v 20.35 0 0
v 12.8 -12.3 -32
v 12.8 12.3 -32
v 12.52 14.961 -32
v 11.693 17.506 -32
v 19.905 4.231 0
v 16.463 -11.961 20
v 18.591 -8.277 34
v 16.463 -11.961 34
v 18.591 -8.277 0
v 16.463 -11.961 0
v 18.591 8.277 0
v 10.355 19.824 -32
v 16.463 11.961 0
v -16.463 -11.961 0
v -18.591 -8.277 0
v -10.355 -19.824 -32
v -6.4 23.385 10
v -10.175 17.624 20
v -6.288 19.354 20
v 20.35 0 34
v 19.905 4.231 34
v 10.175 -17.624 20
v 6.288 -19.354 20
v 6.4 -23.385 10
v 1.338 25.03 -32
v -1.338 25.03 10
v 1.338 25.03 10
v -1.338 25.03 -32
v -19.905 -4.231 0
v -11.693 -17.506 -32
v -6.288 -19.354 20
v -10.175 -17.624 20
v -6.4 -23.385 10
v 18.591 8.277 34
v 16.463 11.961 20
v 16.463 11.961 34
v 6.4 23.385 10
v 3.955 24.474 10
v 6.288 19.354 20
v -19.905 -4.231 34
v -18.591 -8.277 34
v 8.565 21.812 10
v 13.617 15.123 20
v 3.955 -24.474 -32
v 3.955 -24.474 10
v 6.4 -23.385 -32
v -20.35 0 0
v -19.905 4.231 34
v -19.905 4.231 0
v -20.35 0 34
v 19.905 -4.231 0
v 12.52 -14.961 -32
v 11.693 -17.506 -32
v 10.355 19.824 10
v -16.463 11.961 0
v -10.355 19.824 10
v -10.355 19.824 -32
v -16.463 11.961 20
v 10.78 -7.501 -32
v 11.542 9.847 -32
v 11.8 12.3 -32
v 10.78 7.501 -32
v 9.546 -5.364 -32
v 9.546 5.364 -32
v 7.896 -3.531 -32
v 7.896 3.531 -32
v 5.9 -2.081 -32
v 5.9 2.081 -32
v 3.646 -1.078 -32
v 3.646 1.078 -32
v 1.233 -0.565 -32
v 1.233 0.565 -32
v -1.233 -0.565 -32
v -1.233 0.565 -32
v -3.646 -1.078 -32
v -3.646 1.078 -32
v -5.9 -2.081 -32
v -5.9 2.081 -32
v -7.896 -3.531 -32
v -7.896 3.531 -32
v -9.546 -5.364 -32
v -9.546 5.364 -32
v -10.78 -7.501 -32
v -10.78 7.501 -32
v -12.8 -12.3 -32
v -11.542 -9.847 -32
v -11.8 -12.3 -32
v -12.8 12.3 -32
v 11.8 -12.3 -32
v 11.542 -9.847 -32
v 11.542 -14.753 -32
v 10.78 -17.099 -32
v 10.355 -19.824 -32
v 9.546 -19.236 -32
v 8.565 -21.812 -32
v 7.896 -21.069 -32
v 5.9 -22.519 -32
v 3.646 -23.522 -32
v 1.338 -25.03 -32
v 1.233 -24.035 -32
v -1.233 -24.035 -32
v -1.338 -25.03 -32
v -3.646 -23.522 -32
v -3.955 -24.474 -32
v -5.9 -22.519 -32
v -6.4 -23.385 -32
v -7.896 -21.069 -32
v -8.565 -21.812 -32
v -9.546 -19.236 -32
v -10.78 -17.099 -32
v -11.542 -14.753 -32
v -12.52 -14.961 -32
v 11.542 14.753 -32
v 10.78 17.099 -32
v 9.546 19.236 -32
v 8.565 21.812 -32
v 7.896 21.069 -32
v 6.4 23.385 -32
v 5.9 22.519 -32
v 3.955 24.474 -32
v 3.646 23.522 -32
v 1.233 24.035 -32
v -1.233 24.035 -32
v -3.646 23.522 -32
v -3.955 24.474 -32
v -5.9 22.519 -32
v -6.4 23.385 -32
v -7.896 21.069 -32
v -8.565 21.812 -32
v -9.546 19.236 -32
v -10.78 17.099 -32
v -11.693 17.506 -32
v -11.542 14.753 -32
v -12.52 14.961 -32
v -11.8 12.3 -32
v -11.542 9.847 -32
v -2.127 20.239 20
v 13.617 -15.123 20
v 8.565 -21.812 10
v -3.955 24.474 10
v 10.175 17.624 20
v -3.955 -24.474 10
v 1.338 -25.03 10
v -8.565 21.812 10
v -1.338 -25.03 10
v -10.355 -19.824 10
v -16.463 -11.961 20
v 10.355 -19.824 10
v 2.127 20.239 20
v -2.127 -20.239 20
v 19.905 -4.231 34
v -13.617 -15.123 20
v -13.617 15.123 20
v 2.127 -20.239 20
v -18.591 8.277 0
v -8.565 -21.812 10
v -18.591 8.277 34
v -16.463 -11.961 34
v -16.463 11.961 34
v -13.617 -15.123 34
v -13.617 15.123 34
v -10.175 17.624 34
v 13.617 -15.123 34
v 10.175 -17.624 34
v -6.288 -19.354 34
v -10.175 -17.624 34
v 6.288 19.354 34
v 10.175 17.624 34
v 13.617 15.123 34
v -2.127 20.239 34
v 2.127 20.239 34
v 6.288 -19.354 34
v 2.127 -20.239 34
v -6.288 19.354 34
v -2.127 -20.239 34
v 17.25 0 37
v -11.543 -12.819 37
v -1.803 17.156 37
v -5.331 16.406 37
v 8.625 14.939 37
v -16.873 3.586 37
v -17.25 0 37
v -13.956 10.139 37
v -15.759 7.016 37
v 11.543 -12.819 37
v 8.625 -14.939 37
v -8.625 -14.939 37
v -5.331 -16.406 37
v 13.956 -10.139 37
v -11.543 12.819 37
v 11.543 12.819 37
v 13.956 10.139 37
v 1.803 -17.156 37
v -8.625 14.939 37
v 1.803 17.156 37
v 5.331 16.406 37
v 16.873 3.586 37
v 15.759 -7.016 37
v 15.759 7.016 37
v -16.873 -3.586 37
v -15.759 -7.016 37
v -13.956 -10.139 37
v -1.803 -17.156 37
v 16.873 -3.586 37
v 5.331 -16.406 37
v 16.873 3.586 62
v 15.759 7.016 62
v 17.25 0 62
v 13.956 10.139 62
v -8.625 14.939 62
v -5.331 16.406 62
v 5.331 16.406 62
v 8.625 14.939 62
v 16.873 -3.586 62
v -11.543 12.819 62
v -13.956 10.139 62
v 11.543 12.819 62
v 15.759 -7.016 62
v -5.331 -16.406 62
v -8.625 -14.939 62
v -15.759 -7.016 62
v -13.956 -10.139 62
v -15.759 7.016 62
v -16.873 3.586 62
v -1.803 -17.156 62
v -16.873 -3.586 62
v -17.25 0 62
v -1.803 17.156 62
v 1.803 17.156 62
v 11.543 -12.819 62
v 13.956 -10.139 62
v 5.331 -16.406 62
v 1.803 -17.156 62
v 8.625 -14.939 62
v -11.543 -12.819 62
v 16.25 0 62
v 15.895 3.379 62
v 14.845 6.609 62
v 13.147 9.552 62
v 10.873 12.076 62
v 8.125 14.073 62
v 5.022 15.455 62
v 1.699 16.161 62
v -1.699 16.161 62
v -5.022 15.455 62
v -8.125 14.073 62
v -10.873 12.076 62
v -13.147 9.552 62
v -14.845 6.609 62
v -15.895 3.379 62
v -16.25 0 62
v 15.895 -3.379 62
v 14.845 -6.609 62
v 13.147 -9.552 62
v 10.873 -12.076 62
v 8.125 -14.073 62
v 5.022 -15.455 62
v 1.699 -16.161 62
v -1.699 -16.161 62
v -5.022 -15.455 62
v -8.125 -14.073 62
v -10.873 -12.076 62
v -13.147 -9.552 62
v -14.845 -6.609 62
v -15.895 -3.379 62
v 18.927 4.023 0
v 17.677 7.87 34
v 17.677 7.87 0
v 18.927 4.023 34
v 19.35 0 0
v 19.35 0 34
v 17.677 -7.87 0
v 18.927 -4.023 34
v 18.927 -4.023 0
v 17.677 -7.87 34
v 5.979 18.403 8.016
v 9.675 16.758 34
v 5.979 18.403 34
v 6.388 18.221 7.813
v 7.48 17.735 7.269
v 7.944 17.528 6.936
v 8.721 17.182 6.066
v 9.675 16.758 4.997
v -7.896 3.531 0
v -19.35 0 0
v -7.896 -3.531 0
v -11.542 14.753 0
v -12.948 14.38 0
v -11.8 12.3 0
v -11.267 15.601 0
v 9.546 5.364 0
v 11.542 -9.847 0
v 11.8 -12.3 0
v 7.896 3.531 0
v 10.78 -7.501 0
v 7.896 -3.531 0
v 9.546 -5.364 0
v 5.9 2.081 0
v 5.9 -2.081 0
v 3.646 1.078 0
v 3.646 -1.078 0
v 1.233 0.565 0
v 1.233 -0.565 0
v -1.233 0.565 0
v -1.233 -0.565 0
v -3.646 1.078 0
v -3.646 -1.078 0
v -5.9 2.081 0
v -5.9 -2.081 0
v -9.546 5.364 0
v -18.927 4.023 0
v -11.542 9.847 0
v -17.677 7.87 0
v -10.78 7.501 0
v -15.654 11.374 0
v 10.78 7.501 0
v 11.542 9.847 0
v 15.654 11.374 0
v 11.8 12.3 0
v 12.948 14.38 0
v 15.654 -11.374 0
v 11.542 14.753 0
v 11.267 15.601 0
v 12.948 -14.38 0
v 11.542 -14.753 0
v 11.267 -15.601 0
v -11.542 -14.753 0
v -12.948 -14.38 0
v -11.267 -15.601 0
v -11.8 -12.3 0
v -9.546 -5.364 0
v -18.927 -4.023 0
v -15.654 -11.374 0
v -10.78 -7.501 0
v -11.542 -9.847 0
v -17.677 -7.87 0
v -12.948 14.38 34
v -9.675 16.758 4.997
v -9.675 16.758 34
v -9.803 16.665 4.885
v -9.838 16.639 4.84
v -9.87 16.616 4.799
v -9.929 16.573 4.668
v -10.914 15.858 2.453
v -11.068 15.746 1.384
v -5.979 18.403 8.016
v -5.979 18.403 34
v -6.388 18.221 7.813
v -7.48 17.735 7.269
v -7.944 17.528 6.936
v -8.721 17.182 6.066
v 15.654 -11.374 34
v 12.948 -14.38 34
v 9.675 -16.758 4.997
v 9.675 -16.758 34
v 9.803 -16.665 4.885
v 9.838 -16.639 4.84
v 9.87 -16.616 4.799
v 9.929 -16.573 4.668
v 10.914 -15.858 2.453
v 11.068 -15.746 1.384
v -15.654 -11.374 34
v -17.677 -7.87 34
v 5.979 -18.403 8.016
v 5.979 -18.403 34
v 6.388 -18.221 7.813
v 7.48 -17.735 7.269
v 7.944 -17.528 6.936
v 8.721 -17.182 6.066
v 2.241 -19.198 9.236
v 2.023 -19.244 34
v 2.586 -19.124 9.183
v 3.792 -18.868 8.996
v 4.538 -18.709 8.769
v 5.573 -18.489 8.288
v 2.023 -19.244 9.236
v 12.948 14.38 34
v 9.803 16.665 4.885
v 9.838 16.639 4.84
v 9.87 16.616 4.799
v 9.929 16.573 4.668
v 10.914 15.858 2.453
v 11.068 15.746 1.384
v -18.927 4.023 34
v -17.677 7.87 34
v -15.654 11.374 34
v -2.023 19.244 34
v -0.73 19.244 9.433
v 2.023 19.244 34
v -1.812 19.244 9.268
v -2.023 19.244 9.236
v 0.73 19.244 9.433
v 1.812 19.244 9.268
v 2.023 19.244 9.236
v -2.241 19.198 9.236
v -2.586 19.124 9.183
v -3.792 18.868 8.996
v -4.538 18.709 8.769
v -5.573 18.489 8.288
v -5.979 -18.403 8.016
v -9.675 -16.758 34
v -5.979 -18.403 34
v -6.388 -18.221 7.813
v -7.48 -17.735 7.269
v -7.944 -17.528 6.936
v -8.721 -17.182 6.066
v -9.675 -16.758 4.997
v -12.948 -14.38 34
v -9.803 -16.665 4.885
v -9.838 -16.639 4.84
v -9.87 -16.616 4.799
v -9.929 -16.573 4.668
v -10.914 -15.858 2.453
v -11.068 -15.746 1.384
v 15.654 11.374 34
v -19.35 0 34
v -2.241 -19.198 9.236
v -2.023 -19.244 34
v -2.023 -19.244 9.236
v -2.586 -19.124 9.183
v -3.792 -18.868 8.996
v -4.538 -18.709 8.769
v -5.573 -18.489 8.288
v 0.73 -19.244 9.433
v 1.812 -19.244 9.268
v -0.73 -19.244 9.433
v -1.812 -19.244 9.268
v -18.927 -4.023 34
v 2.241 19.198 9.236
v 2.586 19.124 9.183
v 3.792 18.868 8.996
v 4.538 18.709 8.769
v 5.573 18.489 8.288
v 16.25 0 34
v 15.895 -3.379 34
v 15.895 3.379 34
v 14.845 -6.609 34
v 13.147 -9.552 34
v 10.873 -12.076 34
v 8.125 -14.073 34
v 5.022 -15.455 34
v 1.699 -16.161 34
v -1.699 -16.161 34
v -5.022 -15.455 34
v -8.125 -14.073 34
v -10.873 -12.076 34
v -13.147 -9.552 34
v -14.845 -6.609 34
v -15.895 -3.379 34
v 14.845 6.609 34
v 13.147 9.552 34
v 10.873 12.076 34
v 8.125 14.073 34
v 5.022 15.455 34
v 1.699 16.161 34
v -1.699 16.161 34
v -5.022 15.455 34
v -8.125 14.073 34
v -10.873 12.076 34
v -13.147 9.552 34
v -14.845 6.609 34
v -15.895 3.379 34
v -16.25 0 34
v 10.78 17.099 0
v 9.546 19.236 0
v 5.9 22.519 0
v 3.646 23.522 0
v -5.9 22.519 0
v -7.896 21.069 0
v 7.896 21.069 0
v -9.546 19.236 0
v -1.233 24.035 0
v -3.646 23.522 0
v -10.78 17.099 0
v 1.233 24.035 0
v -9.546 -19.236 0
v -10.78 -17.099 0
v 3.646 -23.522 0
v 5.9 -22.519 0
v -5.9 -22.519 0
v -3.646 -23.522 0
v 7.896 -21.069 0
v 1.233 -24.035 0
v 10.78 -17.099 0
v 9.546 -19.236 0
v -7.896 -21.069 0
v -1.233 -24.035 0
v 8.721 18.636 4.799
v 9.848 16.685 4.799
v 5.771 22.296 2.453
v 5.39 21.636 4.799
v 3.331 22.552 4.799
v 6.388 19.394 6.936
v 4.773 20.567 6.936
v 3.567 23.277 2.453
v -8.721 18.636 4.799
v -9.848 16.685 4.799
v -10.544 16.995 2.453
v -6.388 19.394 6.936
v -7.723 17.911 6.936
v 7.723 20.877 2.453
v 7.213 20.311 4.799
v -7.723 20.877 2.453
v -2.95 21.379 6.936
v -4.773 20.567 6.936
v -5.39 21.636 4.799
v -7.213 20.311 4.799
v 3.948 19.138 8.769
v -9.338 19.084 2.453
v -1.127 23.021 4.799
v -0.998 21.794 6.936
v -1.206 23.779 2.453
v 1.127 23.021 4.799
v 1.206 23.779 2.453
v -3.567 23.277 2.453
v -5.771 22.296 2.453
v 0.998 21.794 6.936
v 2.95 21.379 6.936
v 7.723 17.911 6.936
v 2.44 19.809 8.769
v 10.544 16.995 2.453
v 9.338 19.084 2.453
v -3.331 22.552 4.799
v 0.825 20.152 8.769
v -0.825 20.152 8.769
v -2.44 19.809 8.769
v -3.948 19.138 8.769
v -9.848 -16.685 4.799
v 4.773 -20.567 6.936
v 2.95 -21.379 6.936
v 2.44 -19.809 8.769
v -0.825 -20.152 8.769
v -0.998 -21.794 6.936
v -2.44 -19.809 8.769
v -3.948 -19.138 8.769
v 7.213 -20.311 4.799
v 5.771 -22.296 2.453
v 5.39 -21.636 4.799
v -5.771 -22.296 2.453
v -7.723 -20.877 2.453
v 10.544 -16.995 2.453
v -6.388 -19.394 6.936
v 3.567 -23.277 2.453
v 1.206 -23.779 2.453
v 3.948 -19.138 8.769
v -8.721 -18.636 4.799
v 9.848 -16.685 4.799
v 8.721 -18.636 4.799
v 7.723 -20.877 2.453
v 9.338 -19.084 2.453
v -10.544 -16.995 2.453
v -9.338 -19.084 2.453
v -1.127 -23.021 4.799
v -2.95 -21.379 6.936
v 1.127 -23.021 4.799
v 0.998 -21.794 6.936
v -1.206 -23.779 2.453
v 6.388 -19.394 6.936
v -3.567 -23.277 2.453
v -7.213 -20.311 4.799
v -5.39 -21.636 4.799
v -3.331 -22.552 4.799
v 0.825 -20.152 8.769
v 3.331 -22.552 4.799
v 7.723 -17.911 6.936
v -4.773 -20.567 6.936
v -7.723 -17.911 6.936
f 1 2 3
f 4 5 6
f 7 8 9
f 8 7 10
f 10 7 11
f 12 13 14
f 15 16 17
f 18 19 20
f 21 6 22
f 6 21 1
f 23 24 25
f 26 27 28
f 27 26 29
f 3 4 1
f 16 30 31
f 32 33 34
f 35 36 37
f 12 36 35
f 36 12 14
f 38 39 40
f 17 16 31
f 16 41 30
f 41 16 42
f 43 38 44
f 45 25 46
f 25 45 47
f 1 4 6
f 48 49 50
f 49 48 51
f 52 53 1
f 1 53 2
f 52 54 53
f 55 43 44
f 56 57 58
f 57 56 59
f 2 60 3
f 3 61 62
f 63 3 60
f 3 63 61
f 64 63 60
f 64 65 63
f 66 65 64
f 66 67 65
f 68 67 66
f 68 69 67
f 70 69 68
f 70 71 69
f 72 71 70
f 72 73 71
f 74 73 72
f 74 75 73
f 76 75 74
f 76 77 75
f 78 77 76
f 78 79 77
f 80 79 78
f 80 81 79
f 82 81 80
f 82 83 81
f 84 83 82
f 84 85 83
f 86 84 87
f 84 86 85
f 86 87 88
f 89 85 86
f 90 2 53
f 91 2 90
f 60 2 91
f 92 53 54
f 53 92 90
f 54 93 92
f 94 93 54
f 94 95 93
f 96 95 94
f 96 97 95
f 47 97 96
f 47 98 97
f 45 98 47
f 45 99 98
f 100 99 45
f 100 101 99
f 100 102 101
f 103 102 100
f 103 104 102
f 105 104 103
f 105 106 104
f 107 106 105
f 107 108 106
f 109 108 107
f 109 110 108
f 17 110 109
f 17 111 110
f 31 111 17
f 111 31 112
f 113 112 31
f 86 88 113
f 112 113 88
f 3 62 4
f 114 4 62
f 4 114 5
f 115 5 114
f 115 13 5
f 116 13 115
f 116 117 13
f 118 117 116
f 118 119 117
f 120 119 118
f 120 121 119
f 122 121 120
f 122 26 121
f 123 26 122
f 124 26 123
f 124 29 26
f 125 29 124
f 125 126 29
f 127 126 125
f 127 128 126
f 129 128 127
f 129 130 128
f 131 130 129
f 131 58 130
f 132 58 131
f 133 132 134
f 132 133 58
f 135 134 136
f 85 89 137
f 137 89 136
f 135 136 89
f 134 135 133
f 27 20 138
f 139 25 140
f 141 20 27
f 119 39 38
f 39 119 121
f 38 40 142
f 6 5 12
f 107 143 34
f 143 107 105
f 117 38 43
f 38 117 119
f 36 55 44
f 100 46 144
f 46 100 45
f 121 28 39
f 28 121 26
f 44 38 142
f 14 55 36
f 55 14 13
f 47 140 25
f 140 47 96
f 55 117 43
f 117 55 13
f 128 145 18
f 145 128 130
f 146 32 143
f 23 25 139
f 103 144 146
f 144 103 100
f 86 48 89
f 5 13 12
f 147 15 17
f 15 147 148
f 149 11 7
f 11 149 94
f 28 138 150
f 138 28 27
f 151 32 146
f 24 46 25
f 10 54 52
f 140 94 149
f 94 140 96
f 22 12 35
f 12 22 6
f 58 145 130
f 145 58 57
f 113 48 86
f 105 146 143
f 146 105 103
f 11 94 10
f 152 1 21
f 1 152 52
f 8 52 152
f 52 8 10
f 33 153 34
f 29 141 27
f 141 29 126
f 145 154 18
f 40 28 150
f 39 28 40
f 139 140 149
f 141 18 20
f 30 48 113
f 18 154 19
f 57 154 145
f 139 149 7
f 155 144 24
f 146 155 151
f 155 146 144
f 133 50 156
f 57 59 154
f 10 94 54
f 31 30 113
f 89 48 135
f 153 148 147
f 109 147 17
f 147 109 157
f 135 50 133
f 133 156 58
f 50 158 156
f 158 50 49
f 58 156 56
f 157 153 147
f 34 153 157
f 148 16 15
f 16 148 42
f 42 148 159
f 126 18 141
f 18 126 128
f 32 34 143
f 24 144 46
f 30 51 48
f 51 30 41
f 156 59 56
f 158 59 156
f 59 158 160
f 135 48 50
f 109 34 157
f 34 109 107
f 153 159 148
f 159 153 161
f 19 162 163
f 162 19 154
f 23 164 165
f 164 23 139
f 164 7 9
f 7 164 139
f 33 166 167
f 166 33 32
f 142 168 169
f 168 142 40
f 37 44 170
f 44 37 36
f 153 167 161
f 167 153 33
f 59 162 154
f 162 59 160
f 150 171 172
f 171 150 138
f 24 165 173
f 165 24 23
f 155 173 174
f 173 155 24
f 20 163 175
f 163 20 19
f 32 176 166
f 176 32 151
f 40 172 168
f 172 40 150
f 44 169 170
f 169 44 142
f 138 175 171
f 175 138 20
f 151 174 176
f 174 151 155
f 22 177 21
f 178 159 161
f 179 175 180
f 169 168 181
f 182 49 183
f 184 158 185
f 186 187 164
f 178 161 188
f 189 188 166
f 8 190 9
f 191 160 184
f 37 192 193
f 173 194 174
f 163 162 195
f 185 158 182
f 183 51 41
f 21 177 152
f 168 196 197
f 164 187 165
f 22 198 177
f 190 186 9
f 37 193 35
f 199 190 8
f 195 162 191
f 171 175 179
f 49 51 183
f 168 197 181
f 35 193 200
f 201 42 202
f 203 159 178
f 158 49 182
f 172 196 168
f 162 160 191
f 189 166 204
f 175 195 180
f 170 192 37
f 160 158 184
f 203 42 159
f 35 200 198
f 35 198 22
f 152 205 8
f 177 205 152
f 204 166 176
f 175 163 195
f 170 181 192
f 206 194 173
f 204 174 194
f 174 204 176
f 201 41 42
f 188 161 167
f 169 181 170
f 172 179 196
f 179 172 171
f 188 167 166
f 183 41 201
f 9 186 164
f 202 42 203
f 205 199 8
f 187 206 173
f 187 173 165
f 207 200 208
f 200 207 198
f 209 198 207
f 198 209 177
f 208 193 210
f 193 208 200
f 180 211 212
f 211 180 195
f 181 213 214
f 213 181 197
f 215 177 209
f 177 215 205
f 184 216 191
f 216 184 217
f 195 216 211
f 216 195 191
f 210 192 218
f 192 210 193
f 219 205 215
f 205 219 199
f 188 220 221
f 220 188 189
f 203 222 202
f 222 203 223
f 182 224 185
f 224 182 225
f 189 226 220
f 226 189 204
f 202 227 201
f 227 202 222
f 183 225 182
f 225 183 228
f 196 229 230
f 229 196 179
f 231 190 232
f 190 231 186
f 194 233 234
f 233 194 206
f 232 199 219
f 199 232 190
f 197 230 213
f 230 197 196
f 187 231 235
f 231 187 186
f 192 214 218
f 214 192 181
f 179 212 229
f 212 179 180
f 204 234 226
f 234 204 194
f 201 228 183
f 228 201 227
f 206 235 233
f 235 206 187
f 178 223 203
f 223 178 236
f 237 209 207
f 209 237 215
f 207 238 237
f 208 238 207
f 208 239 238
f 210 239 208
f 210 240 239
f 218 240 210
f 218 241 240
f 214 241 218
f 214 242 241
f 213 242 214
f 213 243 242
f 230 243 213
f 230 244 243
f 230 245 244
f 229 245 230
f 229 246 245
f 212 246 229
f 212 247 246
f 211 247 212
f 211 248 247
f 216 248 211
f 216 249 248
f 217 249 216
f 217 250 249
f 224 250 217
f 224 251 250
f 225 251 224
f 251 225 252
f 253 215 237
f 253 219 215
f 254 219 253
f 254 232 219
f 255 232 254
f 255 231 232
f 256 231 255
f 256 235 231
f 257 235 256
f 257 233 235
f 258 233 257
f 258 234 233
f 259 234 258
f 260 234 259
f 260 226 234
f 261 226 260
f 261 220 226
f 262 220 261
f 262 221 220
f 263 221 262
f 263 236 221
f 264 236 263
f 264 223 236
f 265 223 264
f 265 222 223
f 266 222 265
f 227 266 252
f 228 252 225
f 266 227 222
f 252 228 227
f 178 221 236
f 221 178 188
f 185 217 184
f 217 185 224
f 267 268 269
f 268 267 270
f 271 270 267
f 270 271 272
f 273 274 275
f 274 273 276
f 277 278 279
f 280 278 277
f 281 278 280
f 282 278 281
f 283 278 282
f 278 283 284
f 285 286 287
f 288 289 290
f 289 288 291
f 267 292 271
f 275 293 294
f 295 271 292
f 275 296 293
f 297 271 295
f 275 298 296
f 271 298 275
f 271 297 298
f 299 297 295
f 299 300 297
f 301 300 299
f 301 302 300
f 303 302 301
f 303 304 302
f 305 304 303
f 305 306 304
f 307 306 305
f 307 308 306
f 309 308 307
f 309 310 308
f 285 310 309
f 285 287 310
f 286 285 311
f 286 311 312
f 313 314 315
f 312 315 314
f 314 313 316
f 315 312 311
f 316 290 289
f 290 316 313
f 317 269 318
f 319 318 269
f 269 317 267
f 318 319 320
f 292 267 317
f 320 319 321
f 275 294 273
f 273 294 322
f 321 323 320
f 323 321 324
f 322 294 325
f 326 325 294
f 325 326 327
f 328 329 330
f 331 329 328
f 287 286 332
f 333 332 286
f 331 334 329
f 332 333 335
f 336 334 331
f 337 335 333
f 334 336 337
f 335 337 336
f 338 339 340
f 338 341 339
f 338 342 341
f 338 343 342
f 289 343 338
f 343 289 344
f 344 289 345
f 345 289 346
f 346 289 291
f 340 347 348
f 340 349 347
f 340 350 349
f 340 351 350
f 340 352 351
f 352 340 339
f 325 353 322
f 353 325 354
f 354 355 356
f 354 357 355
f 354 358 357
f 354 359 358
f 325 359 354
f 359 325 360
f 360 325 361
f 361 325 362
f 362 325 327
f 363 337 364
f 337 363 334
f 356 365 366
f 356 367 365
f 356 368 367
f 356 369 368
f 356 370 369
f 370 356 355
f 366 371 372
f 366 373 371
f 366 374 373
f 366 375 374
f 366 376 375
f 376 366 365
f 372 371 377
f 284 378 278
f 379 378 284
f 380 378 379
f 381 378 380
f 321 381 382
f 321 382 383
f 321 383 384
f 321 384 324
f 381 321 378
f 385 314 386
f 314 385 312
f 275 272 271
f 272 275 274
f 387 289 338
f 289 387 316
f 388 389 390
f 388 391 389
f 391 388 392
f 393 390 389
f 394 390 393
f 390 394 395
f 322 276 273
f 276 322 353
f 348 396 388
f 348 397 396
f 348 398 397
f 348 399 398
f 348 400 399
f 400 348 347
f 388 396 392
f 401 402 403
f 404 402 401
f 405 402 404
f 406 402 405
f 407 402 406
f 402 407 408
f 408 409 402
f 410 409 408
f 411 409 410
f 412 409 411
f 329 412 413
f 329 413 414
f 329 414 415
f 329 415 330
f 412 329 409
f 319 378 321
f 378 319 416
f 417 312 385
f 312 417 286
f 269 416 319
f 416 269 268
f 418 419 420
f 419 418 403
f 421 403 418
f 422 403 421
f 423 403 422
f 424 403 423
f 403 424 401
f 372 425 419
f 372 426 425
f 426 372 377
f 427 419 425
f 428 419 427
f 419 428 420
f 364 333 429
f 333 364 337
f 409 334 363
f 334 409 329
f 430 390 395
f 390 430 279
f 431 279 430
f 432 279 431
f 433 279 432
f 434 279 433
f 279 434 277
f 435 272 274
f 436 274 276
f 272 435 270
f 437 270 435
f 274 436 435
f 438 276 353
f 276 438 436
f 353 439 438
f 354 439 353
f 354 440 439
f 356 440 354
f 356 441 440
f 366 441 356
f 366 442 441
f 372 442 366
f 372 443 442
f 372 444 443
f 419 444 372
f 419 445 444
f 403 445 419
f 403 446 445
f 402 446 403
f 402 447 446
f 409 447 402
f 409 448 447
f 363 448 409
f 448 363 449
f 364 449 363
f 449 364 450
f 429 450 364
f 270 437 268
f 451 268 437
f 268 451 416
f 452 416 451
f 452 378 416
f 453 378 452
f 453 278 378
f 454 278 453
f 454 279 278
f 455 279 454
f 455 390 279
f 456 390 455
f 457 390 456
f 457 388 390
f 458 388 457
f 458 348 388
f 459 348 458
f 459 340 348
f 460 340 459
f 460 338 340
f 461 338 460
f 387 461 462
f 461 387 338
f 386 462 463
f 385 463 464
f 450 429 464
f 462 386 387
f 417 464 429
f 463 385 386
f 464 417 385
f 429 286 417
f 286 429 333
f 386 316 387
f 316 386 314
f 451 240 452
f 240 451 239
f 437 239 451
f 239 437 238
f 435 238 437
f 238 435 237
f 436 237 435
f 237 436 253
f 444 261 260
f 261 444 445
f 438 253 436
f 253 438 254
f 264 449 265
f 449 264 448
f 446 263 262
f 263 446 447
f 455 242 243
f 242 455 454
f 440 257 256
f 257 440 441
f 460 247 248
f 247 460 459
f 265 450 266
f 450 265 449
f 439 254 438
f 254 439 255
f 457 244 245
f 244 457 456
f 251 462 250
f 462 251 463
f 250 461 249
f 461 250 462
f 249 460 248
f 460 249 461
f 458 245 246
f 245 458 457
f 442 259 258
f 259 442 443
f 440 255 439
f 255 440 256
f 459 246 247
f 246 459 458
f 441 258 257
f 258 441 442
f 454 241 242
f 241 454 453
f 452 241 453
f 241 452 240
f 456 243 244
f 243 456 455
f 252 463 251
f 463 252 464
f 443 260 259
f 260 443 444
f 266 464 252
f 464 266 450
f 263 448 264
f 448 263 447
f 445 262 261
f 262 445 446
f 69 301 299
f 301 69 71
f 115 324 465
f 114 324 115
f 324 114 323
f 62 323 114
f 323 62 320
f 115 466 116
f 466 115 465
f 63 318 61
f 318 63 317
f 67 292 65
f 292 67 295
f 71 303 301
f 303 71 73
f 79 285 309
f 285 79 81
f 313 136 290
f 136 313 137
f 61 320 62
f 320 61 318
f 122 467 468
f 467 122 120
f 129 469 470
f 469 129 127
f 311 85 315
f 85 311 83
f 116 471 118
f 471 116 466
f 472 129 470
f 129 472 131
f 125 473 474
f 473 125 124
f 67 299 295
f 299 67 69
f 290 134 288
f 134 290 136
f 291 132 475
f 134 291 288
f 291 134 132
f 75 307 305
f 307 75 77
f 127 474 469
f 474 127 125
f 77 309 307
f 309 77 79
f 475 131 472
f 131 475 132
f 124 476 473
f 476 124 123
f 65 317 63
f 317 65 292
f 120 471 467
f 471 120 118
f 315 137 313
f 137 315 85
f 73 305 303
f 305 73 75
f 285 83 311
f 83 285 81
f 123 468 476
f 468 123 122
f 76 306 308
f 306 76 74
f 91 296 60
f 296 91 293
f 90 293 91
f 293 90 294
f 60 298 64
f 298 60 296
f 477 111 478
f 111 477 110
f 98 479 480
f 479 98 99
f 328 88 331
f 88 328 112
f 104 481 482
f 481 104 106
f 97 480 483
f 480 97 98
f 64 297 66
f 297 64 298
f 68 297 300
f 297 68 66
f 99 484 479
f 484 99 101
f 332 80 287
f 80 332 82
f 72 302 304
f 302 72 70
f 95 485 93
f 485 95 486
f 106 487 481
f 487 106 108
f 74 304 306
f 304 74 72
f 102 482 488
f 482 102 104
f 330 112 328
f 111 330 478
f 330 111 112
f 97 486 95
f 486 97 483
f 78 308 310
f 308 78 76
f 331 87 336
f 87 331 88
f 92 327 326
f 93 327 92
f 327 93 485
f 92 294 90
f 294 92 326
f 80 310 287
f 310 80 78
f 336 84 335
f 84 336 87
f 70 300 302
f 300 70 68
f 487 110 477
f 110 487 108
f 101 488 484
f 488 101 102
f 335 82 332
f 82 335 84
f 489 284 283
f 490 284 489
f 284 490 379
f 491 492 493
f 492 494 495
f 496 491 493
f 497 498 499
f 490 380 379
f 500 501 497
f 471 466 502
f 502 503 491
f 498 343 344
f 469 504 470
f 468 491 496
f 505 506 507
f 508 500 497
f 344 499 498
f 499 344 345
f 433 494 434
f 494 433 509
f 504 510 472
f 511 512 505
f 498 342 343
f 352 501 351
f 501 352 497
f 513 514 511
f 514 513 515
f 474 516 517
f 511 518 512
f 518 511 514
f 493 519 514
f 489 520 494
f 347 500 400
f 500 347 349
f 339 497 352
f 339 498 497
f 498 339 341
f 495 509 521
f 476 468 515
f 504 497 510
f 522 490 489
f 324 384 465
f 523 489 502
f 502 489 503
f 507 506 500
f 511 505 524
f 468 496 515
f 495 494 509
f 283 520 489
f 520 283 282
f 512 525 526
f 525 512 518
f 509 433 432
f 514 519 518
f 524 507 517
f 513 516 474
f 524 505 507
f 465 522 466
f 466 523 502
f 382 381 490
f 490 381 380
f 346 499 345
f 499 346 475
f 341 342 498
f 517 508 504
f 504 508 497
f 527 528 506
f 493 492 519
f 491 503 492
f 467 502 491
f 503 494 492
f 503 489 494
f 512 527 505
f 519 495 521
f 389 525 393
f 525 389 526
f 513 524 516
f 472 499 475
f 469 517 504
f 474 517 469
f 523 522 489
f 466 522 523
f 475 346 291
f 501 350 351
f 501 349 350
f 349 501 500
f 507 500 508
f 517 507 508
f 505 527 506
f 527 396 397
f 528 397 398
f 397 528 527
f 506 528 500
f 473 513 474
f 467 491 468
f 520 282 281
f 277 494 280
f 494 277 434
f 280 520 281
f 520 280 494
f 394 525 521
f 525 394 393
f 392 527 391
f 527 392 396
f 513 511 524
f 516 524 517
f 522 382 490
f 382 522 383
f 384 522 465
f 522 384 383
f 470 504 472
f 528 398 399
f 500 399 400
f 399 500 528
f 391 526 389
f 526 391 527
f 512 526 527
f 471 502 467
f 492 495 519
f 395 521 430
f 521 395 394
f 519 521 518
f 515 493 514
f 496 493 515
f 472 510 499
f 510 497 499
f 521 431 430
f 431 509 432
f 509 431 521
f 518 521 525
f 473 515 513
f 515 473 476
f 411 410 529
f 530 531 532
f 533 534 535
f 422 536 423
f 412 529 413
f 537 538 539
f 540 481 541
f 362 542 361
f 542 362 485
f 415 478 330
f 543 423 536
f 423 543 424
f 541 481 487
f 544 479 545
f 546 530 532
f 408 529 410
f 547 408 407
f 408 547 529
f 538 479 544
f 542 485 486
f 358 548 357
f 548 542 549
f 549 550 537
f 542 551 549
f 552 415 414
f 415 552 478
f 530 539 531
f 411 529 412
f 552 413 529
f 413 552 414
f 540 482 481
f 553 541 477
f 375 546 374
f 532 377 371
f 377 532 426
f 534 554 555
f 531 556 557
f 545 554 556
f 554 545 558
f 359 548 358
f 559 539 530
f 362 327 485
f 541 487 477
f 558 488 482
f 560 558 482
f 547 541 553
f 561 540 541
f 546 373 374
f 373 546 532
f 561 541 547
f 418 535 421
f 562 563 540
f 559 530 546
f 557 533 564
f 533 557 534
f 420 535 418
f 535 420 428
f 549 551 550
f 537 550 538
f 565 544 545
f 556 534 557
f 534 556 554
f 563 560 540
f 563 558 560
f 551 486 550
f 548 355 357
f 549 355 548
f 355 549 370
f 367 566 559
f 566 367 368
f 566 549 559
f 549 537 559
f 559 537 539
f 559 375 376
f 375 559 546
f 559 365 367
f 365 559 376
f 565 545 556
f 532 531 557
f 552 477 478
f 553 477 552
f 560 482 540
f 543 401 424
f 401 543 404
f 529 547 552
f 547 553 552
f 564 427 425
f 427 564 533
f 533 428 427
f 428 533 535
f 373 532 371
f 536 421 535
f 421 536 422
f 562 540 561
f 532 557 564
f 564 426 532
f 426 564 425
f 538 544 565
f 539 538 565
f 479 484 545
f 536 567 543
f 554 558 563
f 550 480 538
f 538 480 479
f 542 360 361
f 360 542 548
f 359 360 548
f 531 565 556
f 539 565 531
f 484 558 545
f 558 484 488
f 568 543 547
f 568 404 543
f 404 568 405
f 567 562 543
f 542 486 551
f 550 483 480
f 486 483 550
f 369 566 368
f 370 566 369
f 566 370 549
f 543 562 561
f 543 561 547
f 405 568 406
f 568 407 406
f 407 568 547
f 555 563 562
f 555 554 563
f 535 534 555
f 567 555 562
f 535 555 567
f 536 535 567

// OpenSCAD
od = 40.7;
od_low = 34.5;
h_hull = 20;
h = h_hull+14;
h_mid = 3;
h_low = 25;

od1 = 25.6;
h1 = 32;

wall = 1;

dist = -1;

overlap = 10;

id = od - 2*wall;
id_low = od_low - 2*wall;
id1 = od1 - 2*wall;

offset = 0.5 * (od1 + dist);


module outer() {
hull() {
cylinder(d=od, h=h_hull);
translate([0, offset, -h1]) cylinder(d=od1, h=h1+overlap);
translate([0, -offset, -h1]) cylinder(d=od1, h=h1+overlap);
}
cylinder(d=od, h=h);
translate([0, 0, h])cylinder(d1=od, d2=od_low, h=h_mid);
translate([0, 0, h+h_mid])cylinder(d=od_low, h=h_low);
}

difference() {
    outer();
    cylinder(d=id, h=h);
    cylinder(d=id_low, h=h+h_mid+h_low);
    translate([0, offset, -h1]) cylinder(d=id1, h=h1);
    translate([0, -offset, -h1]) cylinder(d=id1, h=h1);
    translate([0, offset, 0])sphere(d=id1);
    translate([0, -offset, 0])sphere(d=id1);
}
